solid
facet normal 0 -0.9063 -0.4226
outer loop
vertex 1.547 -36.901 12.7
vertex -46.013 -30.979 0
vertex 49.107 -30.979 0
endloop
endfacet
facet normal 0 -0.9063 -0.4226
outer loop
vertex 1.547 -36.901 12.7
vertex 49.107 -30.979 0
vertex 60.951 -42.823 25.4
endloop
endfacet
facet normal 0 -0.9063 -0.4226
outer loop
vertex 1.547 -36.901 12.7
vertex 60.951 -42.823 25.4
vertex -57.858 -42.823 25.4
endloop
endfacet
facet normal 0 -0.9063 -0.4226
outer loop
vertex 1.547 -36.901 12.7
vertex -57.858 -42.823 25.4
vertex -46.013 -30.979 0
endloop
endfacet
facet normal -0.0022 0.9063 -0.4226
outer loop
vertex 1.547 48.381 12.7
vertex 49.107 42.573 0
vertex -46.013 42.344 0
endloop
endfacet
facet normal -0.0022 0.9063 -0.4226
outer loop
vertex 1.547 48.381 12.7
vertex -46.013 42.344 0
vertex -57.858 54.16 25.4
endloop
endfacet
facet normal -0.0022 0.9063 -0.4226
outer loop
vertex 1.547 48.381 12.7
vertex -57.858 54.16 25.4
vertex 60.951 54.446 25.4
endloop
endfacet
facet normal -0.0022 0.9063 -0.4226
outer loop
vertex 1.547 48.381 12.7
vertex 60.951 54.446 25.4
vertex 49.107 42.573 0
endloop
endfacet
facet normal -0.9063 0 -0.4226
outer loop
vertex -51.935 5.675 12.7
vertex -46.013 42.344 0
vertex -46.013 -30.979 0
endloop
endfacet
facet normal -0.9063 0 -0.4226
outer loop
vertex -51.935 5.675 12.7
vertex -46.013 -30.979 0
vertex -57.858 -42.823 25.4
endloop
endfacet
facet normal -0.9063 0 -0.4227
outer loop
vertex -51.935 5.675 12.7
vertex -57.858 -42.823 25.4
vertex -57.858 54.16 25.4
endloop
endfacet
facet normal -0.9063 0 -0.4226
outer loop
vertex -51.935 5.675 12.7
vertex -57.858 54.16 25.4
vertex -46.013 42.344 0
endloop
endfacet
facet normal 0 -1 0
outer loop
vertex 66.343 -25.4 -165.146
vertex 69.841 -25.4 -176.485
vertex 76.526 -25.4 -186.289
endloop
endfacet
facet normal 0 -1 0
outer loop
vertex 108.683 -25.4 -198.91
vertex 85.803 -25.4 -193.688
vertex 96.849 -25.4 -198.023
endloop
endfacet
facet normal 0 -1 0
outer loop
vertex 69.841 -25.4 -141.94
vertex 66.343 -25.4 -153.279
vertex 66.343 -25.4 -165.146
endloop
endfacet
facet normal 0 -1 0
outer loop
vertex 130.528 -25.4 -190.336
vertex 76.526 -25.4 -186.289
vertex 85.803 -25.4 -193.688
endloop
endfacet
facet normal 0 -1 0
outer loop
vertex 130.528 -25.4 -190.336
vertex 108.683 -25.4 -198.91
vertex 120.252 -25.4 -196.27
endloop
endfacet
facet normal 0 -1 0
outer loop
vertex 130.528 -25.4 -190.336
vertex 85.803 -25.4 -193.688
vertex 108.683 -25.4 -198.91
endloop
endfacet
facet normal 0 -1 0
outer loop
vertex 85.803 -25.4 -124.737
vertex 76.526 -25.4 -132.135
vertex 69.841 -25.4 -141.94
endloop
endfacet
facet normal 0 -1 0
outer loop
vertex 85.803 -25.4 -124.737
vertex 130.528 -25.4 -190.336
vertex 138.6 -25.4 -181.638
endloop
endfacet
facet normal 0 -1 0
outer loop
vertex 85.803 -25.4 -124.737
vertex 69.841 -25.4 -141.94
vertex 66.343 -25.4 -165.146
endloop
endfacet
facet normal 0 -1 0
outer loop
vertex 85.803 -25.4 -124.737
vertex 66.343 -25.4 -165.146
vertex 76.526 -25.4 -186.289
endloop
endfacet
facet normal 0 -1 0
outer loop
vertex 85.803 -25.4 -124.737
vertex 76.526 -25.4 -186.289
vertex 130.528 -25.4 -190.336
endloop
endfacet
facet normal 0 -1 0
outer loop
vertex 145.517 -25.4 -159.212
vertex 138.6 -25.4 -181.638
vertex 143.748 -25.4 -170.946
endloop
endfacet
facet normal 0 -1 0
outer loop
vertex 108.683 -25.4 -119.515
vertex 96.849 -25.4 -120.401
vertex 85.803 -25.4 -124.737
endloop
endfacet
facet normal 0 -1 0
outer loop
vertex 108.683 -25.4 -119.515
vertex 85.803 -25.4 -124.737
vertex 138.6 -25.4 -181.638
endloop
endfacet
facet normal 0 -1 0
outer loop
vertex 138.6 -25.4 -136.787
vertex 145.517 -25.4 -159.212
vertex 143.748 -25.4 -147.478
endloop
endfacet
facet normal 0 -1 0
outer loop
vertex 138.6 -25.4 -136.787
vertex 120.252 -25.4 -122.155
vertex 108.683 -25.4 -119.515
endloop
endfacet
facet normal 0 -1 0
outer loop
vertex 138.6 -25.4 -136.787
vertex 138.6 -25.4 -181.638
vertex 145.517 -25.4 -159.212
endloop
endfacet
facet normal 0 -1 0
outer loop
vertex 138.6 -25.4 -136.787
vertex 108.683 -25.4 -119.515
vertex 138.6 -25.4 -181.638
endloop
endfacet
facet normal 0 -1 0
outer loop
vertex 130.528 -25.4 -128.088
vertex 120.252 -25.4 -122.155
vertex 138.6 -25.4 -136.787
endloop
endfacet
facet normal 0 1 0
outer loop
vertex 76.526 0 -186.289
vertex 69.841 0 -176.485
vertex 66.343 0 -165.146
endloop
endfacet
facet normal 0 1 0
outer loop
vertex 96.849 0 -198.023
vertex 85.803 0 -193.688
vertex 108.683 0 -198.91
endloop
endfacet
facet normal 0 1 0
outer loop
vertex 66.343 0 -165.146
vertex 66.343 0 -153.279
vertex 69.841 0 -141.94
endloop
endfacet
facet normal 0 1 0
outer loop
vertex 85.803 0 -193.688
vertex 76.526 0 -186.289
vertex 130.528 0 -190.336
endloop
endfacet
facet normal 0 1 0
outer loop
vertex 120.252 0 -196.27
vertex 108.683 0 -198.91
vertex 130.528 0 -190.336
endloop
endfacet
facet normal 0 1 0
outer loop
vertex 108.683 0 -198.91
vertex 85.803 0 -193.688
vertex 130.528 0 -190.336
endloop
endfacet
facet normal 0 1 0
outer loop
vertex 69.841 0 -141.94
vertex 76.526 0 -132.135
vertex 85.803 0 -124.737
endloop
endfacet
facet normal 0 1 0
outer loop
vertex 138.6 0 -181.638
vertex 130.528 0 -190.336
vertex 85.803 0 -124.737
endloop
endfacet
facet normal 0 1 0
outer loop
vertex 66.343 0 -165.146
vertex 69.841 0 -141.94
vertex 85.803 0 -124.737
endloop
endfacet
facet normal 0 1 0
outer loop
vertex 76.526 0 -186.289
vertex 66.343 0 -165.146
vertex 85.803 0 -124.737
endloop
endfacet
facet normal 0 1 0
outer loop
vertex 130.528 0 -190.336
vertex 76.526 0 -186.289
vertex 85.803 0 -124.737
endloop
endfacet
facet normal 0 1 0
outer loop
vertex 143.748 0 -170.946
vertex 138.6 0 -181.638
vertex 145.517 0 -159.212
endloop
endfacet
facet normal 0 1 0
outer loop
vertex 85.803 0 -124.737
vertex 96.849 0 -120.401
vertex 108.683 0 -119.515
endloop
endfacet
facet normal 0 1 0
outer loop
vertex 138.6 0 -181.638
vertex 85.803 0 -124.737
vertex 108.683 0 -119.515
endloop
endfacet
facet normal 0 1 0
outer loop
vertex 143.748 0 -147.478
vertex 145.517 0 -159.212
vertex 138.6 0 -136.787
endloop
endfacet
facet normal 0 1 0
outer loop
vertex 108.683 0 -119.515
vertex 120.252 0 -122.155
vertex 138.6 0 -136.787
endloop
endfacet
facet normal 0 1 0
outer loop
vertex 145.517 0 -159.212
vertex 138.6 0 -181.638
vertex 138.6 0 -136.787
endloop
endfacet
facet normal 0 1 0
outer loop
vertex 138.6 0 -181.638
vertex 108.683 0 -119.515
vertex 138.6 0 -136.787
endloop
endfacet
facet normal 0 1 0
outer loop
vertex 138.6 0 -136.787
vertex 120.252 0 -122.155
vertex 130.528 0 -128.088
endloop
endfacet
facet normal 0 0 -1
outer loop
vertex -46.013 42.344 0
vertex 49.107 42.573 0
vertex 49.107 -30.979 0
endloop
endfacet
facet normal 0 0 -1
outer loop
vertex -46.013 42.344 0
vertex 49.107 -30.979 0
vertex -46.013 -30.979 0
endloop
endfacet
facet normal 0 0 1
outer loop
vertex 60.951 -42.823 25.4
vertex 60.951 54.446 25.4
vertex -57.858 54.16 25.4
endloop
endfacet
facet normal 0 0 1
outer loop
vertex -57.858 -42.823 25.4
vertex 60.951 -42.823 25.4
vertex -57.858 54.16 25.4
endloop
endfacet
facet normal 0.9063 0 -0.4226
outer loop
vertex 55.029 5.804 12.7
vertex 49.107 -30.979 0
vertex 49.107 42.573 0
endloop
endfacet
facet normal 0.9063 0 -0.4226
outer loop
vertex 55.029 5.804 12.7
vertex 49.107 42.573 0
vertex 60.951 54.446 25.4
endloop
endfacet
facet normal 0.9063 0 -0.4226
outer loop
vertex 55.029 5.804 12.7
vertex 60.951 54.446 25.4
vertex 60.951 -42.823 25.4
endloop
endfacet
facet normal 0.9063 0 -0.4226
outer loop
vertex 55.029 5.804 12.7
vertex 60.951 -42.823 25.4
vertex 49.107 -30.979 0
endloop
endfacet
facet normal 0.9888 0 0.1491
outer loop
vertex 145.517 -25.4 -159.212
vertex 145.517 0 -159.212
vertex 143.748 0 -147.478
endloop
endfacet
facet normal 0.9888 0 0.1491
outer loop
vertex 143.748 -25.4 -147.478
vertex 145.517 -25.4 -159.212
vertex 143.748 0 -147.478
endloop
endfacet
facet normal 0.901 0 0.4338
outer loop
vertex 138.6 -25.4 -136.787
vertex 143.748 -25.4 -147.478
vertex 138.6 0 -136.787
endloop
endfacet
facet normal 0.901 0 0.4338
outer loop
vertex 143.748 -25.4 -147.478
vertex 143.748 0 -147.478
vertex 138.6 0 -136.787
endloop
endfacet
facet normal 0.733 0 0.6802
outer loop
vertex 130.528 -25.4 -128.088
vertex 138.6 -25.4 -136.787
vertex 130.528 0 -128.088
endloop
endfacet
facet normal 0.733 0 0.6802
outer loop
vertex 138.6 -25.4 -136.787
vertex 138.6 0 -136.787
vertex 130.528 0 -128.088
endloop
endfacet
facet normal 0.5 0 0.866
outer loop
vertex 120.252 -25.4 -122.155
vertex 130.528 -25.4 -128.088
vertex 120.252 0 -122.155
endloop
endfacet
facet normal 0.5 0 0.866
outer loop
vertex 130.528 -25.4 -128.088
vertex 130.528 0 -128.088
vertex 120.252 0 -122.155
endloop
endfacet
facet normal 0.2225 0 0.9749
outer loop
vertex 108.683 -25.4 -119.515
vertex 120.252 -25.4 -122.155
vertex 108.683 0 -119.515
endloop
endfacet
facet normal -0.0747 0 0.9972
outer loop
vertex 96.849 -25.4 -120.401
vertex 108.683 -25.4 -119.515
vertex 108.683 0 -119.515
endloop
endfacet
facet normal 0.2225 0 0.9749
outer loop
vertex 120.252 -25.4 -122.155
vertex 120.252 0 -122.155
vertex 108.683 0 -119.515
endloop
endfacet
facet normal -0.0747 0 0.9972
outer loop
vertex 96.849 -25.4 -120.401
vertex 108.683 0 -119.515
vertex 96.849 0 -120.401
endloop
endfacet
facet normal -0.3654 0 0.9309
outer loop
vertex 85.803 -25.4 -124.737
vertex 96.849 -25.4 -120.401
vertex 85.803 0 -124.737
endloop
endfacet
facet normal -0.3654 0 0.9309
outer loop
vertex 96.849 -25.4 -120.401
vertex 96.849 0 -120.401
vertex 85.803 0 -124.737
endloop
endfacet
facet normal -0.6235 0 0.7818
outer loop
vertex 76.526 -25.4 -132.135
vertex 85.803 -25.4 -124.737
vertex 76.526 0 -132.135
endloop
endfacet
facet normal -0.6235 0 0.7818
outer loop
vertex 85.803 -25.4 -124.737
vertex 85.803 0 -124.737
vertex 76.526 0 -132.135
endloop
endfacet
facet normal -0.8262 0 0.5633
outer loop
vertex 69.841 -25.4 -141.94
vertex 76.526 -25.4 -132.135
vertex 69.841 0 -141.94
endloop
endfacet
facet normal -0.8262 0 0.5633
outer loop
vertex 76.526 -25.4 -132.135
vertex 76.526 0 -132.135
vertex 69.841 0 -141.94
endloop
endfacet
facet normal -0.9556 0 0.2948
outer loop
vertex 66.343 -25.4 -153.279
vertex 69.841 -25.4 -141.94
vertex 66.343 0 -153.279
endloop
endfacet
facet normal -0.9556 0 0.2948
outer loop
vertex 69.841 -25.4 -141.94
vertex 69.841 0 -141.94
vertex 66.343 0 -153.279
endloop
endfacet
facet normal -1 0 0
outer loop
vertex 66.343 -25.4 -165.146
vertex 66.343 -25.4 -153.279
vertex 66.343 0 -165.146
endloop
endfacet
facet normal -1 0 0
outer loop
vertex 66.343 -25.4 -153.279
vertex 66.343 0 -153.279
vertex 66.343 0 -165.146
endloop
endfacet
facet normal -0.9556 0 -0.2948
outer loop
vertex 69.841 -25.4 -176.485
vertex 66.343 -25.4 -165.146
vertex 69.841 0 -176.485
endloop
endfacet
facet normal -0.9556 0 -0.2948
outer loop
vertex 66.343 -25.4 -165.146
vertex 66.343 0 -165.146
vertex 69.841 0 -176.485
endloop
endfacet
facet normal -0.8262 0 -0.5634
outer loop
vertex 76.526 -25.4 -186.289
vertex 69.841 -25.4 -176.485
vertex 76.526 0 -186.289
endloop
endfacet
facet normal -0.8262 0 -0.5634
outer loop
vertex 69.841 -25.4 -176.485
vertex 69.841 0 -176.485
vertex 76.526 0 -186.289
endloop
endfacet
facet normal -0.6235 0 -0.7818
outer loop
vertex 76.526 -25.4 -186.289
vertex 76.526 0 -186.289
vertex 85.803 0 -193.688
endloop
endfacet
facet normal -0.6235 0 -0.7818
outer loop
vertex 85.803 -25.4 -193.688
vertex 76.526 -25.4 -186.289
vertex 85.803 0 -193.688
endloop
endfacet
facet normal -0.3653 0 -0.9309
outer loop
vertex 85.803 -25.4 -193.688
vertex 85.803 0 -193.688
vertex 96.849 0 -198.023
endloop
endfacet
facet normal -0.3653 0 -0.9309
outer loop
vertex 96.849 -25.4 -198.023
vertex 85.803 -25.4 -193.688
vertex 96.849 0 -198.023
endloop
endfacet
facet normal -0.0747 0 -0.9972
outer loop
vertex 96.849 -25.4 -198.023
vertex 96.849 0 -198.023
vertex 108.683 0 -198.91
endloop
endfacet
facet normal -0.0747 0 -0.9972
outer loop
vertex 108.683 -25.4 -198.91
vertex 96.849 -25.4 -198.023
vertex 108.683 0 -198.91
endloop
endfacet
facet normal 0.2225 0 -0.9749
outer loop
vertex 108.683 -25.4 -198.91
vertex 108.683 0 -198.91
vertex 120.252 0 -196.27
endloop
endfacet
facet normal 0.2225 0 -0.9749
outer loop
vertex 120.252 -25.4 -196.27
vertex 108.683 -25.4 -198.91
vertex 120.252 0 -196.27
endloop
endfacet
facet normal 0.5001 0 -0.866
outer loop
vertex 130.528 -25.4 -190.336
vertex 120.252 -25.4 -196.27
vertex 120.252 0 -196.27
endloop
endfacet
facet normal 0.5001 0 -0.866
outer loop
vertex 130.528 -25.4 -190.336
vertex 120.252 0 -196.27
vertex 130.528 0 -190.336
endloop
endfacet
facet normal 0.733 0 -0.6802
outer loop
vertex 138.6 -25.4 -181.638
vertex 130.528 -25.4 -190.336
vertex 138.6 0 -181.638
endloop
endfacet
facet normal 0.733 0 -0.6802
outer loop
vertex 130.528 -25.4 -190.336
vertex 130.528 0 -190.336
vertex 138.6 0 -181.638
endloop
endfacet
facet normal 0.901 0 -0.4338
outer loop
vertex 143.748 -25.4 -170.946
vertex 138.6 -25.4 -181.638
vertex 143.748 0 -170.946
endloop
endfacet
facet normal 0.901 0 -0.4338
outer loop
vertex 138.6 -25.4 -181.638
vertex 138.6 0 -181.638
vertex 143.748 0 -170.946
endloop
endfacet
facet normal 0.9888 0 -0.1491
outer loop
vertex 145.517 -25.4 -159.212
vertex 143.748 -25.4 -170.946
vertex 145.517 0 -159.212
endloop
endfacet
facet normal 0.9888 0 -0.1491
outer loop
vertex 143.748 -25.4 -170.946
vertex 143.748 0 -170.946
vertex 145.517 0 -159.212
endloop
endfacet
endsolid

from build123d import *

# Parameters (mm, degrees)
F1_DEPTH = 25.4
F1_TAPER = -25
F2_R     = 39.808975919
F3_DEPTH = 25.4


with BuildPart() as f1:
    # F0 (on Top) → F1 (new body)
    with BuildSketch(Plane.XY):
        Polygon((49.1066873074, 42.5734370947), (-46.013340354, 42.344301939), (-46.013340354, -30.9791862965), (49.1066873074, -30.9791862965), align=None)
    extrude(amount=F1_DEPTH, taper=F1_TAPER)


with BuildPart() as f3:
    # F2 (on Front) → F3 (new body)
    with BuildSketch(Plane.XZ):
        with Locations((105.707809329, -159.2123806477)):
            Circle(F2_R)
    extrude(amount=F3_DEPTH)


solid = Compound([f1.part, f3.part])
